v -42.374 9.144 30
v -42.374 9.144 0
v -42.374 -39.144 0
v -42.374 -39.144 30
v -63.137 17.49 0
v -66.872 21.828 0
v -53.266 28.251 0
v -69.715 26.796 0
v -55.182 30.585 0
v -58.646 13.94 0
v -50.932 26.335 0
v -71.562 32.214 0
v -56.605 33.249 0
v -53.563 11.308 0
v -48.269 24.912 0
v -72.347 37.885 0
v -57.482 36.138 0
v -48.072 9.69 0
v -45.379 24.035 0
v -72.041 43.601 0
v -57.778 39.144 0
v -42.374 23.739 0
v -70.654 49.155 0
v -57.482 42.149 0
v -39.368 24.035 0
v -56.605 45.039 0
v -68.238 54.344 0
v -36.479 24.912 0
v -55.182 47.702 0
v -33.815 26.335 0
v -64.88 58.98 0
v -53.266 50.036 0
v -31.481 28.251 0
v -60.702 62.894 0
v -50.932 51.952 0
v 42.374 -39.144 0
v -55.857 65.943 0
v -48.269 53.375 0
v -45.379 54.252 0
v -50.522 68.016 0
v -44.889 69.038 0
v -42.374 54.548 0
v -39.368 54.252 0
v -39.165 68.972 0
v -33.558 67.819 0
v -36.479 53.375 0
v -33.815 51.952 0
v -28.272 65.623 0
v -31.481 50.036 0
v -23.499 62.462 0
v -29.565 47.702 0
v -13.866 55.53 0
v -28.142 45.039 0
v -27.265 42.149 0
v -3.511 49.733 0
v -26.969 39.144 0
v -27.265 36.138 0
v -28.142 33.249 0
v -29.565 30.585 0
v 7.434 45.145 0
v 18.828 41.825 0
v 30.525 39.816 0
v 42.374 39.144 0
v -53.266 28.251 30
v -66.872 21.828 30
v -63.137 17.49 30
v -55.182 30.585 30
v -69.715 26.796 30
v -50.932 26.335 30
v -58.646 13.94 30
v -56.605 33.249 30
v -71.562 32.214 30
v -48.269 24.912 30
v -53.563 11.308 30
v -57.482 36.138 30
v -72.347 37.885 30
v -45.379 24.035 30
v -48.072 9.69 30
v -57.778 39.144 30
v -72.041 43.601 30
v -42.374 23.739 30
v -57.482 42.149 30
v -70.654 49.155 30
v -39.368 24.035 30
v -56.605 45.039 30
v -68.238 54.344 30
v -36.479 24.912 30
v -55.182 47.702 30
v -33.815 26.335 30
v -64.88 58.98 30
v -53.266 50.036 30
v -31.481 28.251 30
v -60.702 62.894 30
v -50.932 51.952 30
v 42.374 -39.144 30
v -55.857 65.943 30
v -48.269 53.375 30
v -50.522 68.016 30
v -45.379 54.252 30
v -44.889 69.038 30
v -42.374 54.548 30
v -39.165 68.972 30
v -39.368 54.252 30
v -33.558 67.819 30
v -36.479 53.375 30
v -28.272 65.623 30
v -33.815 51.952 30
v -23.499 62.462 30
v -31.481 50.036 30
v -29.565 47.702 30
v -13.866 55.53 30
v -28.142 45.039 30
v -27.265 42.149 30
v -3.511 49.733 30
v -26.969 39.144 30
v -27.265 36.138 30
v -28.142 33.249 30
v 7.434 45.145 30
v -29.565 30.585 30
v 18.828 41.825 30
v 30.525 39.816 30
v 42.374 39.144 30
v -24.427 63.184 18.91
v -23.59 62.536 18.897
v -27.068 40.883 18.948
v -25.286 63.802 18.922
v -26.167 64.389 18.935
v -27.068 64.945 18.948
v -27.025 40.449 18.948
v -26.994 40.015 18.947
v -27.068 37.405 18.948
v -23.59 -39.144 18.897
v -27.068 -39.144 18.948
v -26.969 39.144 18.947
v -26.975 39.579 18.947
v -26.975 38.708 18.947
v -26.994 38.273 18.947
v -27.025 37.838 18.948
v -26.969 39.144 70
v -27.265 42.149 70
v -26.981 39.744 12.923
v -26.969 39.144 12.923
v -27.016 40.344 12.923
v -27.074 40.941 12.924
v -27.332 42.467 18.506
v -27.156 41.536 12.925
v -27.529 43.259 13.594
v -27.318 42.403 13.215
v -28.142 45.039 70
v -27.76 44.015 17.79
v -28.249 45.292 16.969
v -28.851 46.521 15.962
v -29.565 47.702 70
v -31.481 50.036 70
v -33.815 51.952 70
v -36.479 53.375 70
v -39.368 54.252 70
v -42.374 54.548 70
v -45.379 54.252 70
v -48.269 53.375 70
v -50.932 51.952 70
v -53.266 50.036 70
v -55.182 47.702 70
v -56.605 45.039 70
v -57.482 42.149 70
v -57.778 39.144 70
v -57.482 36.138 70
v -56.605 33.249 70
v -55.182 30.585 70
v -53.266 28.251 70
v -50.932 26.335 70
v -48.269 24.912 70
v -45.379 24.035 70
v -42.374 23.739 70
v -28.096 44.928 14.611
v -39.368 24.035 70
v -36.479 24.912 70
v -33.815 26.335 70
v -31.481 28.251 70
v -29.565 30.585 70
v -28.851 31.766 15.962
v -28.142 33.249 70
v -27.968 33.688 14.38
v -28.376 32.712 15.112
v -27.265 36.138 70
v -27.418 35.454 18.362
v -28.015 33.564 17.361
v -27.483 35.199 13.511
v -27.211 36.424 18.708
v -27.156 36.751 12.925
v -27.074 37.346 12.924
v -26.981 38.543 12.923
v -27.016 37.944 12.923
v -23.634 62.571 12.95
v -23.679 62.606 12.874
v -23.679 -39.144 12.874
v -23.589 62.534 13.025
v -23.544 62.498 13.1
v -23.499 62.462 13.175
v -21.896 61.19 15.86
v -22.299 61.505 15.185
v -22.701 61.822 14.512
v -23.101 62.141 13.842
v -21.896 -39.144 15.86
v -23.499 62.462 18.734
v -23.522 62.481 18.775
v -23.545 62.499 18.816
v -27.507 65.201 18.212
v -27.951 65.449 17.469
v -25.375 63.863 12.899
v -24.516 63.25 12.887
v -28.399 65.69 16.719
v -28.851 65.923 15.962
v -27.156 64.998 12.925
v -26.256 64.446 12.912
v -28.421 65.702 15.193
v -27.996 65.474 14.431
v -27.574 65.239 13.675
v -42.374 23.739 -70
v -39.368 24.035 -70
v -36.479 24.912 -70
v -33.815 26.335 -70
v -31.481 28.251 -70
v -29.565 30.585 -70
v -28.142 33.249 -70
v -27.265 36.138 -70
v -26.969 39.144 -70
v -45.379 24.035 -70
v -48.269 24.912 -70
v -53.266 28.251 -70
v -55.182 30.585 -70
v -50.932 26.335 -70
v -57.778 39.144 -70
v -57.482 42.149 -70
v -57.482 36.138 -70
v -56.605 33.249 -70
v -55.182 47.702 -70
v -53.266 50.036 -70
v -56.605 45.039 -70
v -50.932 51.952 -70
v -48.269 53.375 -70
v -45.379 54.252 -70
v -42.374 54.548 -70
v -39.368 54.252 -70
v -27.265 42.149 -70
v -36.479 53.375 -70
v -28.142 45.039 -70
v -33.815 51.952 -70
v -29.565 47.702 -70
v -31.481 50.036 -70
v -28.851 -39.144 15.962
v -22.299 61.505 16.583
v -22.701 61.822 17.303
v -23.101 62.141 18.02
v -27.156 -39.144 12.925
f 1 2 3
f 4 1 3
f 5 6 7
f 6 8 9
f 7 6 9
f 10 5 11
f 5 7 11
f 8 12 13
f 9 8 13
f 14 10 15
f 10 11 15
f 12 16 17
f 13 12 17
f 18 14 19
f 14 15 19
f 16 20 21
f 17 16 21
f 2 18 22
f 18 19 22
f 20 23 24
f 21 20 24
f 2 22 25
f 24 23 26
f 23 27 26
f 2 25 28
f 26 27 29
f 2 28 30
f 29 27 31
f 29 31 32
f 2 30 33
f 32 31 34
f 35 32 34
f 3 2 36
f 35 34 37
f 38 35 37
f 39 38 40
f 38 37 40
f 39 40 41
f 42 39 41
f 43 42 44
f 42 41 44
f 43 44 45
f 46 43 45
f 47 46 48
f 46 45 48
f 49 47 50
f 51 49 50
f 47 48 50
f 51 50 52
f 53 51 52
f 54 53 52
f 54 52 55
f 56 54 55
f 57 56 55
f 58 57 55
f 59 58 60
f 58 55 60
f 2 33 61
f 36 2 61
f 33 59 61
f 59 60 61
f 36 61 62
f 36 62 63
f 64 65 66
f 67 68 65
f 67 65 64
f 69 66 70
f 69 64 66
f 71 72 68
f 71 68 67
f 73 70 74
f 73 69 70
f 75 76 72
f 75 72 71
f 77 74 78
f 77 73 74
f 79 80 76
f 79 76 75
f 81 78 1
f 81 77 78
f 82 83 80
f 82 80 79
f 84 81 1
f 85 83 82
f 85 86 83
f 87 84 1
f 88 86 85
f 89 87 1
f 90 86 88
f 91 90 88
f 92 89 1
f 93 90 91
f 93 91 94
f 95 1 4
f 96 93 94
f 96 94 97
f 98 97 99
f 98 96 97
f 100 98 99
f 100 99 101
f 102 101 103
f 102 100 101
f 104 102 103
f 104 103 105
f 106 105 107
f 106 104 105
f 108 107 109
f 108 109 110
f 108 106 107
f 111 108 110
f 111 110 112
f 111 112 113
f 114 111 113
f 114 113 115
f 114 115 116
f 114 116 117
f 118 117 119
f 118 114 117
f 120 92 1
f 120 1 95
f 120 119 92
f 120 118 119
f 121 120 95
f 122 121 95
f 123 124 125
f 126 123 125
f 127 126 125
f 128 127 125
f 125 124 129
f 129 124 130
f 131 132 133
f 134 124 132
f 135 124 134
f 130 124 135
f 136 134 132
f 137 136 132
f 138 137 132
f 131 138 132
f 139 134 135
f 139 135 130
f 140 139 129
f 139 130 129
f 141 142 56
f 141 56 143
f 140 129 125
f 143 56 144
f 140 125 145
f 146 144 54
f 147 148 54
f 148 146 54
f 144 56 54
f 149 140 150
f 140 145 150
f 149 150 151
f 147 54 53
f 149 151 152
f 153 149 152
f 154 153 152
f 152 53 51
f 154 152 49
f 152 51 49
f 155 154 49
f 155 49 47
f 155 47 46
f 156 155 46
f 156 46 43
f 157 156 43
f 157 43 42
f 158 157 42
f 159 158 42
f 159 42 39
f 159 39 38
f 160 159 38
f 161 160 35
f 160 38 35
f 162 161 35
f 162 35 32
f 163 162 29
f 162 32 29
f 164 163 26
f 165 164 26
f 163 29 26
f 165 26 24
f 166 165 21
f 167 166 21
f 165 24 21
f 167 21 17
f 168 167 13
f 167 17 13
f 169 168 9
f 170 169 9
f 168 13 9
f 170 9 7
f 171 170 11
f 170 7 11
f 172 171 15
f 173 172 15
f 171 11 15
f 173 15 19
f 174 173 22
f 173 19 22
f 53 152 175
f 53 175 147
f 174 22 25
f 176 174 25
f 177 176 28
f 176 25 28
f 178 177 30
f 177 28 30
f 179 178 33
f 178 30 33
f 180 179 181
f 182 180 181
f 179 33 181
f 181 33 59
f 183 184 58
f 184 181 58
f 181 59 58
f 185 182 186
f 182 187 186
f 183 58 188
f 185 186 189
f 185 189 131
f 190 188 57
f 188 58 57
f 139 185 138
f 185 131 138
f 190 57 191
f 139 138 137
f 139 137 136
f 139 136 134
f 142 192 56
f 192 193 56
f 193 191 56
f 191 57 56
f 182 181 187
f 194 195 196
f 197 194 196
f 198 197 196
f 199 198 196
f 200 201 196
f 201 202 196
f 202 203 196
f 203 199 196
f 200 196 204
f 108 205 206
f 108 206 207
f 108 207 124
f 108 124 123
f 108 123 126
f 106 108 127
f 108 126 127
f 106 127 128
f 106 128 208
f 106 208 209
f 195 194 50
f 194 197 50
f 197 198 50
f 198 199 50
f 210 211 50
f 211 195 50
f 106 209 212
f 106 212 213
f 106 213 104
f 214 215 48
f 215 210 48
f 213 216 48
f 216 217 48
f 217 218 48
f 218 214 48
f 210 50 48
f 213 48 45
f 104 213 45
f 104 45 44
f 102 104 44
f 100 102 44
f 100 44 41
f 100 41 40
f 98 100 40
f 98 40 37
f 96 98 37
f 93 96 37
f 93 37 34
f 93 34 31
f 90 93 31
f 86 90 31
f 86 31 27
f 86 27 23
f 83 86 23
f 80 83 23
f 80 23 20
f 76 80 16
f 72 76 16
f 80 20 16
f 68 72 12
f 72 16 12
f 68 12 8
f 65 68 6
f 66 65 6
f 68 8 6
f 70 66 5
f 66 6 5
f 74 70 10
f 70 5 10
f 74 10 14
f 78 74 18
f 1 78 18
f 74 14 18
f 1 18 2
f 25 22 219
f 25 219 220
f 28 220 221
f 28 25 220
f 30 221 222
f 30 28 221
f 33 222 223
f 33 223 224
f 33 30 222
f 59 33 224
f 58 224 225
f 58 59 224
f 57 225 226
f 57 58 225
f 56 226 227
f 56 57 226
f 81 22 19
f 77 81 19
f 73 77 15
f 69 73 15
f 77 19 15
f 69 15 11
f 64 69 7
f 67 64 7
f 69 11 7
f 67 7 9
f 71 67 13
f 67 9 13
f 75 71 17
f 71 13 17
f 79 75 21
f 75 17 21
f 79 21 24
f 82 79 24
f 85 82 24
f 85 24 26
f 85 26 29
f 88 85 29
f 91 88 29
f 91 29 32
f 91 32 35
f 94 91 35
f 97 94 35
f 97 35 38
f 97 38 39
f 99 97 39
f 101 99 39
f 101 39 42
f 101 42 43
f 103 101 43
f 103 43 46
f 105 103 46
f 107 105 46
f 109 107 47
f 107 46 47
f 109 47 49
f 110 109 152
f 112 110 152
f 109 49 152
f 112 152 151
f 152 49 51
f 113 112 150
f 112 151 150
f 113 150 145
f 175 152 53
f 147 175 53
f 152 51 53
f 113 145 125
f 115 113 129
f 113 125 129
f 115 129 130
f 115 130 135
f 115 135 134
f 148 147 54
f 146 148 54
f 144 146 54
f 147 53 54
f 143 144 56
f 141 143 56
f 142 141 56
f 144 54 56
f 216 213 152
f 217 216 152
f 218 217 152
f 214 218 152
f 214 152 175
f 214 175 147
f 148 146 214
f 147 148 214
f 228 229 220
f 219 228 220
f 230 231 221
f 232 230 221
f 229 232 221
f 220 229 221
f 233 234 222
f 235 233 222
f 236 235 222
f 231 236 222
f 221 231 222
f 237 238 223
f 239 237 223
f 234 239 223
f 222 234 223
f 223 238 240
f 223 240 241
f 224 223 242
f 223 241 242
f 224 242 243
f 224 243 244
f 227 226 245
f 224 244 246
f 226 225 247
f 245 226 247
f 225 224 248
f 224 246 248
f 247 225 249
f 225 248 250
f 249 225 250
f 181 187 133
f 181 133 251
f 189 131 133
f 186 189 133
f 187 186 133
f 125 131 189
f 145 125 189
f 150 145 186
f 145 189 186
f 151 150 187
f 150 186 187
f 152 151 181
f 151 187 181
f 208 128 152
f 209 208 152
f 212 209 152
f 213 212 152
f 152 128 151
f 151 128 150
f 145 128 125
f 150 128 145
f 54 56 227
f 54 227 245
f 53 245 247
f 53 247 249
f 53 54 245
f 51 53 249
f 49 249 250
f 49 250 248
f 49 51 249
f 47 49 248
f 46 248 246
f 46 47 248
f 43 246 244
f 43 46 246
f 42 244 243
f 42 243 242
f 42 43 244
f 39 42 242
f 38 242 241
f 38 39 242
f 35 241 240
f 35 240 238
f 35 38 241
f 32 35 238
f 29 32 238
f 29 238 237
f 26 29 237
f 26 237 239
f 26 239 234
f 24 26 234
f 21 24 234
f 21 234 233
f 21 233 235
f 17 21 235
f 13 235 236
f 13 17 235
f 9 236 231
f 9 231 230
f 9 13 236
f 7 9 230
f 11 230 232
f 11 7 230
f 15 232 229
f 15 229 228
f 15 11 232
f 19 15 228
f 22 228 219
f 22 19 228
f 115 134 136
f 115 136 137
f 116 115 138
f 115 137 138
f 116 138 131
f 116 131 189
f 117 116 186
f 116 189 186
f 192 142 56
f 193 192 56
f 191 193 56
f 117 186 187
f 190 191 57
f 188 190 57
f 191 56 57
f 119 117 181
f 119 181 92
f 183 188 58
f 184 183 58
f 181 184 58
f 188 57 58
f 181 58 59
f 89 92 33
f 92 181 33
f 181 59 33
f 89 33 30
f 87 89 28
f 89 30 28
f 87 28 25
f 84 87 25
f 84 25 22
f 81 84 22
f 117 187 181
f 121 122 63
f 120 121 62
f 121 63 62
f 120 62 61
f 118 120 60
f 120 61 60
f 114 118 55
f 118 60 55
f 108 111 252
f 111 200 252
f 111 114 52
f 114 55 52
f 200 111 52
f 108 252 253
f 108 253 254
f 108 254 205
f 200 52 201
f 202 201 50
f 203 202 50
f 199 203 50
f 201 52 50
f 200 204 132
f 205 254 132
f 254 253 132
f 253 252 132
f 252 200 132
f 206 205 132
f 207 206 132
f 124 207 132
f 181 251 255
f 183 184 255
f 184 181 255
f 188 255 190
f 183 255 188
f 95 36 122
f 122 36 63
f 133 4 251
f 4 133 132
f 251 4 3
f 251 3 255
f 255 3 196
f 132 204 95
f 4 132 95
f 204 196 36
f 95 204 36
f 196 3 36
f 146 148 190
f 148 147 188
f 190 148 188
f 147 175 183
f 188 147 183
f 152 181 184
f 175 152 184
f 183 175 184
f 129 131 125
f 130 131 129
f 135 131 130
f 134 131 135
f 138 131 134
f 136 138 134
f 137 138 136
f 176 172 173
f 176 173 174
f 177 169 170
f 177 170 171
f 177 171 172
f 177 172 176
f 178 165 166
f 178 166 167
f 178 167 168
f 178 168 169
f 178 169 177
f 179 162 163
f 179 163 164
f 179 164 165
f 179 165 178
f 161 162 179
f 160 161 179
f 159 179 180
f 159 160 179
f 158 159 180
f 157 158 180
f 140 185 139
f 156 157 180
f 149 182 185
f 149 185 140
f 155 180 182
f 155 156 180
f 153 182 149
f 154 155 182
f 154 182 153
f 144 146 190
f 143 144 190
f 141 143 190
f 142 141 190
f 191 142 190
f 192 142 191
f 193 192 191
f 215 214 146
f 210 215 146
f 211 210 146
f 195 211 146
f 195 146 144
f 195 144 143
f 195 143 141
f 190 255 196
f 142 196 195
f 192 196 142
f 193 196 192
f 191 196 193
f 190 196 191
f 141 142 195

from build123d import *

# Parameters (mm, degrees)
F1_DEPTH = 30
F2_DEPTH = 70
F4_DEPTH = 125


with BuildPart() as f1:
    # F0 (on Top) → F1 (new body)
    with BuildSketch(Plane.XY):
        with BuildLine():
            ThreePointArc((-23.4990818194, 62.4621903911), (-70.6538983107, 49.154732424), (-42.3735489763, 9.1436464927))
            Line((-42.3735489763, 9.1436464927), (-42.3735489763, 23.7392992028))
            ThreePointArc((-42.3735489763, 23.7392992028), (-53.2660674047, 50.0361649211), (-26.9692016865, 39.1436464927))
            Line((-26.9692016865, 39.1436464927), (-12.3735489763, 39.1436464927))
            ThreePointArc((-12.3735489763, 39.1436464927), (-15.2974154386, 52.0619665323), (-23.4990818194, 62.4621903911))
        make_face()
        with BuildLine():
            Line((-12.3735489763, 39.1436464927), (42.3735489763, 39.1436464927))
            ThreePointArc((42.3735489763, 39.1436464927), (7.4344663557, 45.145294775), (-23.4990818194, 62.4621903911))
            ThreePointArc((-23.4990818194, 62.4621903911), (-15.2974154386, 52.0619665323), (-12.3735489763, 39.1436464927))
        make_face()
        with BuildLine():
            Line((-42.3735489763, -39.1436464927), (42.3735489763, -39.1436464927))
            Line((42.3735489763, -39.1436464927), (42.3735489763, 39.1436464927))
            Line((42.3735489763, 39.1436464927), (-12.3735489763, 39.1436464927))
            ThreePointArc((-12.3735489763, 39.1436464927), (-21.1603455407, 17.9304430571), (-42.3735489763, 9.1436464927))
            Line((-42.3735489763, 9.1436464927), (-42.3735489763, -39.1436464927))
        make_face()
        with BuildLine():
            Line((-42.3735489763, 23.7392992028), (-42.3735489763, 9.1436464927))
            ThreePointArc((-42.3735489763, 9.1436464927), (-21.1603455407, 17.9304430571), (-12.3735489763, 39.1436464927))
            Line((-12.3735489763, 39.1436464927), (-26.9692016865, 39.1436464927))
            ThreePointArc((-26.9692016865, 39.1436464927), (-31.4810305479, 28.2511280643), (-42.3735489763, 23.7392992028))
        make_face()
    extrude(amount=F1_DEPTH)


with BuildPart() as f2:
    # F0 (on Top) → F2 (new body, symmetric)
    with BuildSketch(Plane.XY):
        with BuildLine():
            ThreePointArc((-26.9692016865, 39.1436464927), (-53.2660674047, 50.0361649211), (-42.3735489763, 23.7392992028))
            Line((-42.3735489763, 23.7392992028), (-42.3735489763, 39.1436464927))
            Line((-42.3735489763, 39.1436464927), (-26.9692016865, 39.1436464927))
        make_face()
        with BuildLine():
            Line((-42.3735489763, 39.1436464927), (-42.3735489763, 23.7392992028))
            ThreePointArc((-42.3735489763, 23.7392992028), (-31.4810305479, 28.2511280643), (-26.9692016865, 39.1436464927))
            Line((-26.9692016865, 39.1436464927), (-42.3735489763, 39.1436464927))
        make_face()
    extrude(amount=F2_DEPTH, both=True)


with BuildPart() as f4_tool:
    # F3 (on face) → F4 (new body)
    with BuildSketch(Plane.XZ.offset(39.1436464927)):
        Polygon((-23.6786928732, 12.8742545268), (-21.895729939, 15.8602743126), (-23.5902174627, 18.8973754005), (-27.0676679205, 18.9484567026), (-28.8506308547, 15.9624369167), (-27.156143331, 12.9253358288), align=None)
    extrude(amount=-F4_DEPTH)


with BuildPart() as f1_1:
    add(f1.part)

    # F4: cut by f4_tool
    add(f4_tool.part, mode=Mode.SUBTRACT)


with BuildPart() as f2_1:
    add(f2.part)

    # F4: cut by f4_tool
    add(f4_tool.part, mode=Mode.SUBTRACT)


solid = Compound([f1_1.part, f2_1.part])
